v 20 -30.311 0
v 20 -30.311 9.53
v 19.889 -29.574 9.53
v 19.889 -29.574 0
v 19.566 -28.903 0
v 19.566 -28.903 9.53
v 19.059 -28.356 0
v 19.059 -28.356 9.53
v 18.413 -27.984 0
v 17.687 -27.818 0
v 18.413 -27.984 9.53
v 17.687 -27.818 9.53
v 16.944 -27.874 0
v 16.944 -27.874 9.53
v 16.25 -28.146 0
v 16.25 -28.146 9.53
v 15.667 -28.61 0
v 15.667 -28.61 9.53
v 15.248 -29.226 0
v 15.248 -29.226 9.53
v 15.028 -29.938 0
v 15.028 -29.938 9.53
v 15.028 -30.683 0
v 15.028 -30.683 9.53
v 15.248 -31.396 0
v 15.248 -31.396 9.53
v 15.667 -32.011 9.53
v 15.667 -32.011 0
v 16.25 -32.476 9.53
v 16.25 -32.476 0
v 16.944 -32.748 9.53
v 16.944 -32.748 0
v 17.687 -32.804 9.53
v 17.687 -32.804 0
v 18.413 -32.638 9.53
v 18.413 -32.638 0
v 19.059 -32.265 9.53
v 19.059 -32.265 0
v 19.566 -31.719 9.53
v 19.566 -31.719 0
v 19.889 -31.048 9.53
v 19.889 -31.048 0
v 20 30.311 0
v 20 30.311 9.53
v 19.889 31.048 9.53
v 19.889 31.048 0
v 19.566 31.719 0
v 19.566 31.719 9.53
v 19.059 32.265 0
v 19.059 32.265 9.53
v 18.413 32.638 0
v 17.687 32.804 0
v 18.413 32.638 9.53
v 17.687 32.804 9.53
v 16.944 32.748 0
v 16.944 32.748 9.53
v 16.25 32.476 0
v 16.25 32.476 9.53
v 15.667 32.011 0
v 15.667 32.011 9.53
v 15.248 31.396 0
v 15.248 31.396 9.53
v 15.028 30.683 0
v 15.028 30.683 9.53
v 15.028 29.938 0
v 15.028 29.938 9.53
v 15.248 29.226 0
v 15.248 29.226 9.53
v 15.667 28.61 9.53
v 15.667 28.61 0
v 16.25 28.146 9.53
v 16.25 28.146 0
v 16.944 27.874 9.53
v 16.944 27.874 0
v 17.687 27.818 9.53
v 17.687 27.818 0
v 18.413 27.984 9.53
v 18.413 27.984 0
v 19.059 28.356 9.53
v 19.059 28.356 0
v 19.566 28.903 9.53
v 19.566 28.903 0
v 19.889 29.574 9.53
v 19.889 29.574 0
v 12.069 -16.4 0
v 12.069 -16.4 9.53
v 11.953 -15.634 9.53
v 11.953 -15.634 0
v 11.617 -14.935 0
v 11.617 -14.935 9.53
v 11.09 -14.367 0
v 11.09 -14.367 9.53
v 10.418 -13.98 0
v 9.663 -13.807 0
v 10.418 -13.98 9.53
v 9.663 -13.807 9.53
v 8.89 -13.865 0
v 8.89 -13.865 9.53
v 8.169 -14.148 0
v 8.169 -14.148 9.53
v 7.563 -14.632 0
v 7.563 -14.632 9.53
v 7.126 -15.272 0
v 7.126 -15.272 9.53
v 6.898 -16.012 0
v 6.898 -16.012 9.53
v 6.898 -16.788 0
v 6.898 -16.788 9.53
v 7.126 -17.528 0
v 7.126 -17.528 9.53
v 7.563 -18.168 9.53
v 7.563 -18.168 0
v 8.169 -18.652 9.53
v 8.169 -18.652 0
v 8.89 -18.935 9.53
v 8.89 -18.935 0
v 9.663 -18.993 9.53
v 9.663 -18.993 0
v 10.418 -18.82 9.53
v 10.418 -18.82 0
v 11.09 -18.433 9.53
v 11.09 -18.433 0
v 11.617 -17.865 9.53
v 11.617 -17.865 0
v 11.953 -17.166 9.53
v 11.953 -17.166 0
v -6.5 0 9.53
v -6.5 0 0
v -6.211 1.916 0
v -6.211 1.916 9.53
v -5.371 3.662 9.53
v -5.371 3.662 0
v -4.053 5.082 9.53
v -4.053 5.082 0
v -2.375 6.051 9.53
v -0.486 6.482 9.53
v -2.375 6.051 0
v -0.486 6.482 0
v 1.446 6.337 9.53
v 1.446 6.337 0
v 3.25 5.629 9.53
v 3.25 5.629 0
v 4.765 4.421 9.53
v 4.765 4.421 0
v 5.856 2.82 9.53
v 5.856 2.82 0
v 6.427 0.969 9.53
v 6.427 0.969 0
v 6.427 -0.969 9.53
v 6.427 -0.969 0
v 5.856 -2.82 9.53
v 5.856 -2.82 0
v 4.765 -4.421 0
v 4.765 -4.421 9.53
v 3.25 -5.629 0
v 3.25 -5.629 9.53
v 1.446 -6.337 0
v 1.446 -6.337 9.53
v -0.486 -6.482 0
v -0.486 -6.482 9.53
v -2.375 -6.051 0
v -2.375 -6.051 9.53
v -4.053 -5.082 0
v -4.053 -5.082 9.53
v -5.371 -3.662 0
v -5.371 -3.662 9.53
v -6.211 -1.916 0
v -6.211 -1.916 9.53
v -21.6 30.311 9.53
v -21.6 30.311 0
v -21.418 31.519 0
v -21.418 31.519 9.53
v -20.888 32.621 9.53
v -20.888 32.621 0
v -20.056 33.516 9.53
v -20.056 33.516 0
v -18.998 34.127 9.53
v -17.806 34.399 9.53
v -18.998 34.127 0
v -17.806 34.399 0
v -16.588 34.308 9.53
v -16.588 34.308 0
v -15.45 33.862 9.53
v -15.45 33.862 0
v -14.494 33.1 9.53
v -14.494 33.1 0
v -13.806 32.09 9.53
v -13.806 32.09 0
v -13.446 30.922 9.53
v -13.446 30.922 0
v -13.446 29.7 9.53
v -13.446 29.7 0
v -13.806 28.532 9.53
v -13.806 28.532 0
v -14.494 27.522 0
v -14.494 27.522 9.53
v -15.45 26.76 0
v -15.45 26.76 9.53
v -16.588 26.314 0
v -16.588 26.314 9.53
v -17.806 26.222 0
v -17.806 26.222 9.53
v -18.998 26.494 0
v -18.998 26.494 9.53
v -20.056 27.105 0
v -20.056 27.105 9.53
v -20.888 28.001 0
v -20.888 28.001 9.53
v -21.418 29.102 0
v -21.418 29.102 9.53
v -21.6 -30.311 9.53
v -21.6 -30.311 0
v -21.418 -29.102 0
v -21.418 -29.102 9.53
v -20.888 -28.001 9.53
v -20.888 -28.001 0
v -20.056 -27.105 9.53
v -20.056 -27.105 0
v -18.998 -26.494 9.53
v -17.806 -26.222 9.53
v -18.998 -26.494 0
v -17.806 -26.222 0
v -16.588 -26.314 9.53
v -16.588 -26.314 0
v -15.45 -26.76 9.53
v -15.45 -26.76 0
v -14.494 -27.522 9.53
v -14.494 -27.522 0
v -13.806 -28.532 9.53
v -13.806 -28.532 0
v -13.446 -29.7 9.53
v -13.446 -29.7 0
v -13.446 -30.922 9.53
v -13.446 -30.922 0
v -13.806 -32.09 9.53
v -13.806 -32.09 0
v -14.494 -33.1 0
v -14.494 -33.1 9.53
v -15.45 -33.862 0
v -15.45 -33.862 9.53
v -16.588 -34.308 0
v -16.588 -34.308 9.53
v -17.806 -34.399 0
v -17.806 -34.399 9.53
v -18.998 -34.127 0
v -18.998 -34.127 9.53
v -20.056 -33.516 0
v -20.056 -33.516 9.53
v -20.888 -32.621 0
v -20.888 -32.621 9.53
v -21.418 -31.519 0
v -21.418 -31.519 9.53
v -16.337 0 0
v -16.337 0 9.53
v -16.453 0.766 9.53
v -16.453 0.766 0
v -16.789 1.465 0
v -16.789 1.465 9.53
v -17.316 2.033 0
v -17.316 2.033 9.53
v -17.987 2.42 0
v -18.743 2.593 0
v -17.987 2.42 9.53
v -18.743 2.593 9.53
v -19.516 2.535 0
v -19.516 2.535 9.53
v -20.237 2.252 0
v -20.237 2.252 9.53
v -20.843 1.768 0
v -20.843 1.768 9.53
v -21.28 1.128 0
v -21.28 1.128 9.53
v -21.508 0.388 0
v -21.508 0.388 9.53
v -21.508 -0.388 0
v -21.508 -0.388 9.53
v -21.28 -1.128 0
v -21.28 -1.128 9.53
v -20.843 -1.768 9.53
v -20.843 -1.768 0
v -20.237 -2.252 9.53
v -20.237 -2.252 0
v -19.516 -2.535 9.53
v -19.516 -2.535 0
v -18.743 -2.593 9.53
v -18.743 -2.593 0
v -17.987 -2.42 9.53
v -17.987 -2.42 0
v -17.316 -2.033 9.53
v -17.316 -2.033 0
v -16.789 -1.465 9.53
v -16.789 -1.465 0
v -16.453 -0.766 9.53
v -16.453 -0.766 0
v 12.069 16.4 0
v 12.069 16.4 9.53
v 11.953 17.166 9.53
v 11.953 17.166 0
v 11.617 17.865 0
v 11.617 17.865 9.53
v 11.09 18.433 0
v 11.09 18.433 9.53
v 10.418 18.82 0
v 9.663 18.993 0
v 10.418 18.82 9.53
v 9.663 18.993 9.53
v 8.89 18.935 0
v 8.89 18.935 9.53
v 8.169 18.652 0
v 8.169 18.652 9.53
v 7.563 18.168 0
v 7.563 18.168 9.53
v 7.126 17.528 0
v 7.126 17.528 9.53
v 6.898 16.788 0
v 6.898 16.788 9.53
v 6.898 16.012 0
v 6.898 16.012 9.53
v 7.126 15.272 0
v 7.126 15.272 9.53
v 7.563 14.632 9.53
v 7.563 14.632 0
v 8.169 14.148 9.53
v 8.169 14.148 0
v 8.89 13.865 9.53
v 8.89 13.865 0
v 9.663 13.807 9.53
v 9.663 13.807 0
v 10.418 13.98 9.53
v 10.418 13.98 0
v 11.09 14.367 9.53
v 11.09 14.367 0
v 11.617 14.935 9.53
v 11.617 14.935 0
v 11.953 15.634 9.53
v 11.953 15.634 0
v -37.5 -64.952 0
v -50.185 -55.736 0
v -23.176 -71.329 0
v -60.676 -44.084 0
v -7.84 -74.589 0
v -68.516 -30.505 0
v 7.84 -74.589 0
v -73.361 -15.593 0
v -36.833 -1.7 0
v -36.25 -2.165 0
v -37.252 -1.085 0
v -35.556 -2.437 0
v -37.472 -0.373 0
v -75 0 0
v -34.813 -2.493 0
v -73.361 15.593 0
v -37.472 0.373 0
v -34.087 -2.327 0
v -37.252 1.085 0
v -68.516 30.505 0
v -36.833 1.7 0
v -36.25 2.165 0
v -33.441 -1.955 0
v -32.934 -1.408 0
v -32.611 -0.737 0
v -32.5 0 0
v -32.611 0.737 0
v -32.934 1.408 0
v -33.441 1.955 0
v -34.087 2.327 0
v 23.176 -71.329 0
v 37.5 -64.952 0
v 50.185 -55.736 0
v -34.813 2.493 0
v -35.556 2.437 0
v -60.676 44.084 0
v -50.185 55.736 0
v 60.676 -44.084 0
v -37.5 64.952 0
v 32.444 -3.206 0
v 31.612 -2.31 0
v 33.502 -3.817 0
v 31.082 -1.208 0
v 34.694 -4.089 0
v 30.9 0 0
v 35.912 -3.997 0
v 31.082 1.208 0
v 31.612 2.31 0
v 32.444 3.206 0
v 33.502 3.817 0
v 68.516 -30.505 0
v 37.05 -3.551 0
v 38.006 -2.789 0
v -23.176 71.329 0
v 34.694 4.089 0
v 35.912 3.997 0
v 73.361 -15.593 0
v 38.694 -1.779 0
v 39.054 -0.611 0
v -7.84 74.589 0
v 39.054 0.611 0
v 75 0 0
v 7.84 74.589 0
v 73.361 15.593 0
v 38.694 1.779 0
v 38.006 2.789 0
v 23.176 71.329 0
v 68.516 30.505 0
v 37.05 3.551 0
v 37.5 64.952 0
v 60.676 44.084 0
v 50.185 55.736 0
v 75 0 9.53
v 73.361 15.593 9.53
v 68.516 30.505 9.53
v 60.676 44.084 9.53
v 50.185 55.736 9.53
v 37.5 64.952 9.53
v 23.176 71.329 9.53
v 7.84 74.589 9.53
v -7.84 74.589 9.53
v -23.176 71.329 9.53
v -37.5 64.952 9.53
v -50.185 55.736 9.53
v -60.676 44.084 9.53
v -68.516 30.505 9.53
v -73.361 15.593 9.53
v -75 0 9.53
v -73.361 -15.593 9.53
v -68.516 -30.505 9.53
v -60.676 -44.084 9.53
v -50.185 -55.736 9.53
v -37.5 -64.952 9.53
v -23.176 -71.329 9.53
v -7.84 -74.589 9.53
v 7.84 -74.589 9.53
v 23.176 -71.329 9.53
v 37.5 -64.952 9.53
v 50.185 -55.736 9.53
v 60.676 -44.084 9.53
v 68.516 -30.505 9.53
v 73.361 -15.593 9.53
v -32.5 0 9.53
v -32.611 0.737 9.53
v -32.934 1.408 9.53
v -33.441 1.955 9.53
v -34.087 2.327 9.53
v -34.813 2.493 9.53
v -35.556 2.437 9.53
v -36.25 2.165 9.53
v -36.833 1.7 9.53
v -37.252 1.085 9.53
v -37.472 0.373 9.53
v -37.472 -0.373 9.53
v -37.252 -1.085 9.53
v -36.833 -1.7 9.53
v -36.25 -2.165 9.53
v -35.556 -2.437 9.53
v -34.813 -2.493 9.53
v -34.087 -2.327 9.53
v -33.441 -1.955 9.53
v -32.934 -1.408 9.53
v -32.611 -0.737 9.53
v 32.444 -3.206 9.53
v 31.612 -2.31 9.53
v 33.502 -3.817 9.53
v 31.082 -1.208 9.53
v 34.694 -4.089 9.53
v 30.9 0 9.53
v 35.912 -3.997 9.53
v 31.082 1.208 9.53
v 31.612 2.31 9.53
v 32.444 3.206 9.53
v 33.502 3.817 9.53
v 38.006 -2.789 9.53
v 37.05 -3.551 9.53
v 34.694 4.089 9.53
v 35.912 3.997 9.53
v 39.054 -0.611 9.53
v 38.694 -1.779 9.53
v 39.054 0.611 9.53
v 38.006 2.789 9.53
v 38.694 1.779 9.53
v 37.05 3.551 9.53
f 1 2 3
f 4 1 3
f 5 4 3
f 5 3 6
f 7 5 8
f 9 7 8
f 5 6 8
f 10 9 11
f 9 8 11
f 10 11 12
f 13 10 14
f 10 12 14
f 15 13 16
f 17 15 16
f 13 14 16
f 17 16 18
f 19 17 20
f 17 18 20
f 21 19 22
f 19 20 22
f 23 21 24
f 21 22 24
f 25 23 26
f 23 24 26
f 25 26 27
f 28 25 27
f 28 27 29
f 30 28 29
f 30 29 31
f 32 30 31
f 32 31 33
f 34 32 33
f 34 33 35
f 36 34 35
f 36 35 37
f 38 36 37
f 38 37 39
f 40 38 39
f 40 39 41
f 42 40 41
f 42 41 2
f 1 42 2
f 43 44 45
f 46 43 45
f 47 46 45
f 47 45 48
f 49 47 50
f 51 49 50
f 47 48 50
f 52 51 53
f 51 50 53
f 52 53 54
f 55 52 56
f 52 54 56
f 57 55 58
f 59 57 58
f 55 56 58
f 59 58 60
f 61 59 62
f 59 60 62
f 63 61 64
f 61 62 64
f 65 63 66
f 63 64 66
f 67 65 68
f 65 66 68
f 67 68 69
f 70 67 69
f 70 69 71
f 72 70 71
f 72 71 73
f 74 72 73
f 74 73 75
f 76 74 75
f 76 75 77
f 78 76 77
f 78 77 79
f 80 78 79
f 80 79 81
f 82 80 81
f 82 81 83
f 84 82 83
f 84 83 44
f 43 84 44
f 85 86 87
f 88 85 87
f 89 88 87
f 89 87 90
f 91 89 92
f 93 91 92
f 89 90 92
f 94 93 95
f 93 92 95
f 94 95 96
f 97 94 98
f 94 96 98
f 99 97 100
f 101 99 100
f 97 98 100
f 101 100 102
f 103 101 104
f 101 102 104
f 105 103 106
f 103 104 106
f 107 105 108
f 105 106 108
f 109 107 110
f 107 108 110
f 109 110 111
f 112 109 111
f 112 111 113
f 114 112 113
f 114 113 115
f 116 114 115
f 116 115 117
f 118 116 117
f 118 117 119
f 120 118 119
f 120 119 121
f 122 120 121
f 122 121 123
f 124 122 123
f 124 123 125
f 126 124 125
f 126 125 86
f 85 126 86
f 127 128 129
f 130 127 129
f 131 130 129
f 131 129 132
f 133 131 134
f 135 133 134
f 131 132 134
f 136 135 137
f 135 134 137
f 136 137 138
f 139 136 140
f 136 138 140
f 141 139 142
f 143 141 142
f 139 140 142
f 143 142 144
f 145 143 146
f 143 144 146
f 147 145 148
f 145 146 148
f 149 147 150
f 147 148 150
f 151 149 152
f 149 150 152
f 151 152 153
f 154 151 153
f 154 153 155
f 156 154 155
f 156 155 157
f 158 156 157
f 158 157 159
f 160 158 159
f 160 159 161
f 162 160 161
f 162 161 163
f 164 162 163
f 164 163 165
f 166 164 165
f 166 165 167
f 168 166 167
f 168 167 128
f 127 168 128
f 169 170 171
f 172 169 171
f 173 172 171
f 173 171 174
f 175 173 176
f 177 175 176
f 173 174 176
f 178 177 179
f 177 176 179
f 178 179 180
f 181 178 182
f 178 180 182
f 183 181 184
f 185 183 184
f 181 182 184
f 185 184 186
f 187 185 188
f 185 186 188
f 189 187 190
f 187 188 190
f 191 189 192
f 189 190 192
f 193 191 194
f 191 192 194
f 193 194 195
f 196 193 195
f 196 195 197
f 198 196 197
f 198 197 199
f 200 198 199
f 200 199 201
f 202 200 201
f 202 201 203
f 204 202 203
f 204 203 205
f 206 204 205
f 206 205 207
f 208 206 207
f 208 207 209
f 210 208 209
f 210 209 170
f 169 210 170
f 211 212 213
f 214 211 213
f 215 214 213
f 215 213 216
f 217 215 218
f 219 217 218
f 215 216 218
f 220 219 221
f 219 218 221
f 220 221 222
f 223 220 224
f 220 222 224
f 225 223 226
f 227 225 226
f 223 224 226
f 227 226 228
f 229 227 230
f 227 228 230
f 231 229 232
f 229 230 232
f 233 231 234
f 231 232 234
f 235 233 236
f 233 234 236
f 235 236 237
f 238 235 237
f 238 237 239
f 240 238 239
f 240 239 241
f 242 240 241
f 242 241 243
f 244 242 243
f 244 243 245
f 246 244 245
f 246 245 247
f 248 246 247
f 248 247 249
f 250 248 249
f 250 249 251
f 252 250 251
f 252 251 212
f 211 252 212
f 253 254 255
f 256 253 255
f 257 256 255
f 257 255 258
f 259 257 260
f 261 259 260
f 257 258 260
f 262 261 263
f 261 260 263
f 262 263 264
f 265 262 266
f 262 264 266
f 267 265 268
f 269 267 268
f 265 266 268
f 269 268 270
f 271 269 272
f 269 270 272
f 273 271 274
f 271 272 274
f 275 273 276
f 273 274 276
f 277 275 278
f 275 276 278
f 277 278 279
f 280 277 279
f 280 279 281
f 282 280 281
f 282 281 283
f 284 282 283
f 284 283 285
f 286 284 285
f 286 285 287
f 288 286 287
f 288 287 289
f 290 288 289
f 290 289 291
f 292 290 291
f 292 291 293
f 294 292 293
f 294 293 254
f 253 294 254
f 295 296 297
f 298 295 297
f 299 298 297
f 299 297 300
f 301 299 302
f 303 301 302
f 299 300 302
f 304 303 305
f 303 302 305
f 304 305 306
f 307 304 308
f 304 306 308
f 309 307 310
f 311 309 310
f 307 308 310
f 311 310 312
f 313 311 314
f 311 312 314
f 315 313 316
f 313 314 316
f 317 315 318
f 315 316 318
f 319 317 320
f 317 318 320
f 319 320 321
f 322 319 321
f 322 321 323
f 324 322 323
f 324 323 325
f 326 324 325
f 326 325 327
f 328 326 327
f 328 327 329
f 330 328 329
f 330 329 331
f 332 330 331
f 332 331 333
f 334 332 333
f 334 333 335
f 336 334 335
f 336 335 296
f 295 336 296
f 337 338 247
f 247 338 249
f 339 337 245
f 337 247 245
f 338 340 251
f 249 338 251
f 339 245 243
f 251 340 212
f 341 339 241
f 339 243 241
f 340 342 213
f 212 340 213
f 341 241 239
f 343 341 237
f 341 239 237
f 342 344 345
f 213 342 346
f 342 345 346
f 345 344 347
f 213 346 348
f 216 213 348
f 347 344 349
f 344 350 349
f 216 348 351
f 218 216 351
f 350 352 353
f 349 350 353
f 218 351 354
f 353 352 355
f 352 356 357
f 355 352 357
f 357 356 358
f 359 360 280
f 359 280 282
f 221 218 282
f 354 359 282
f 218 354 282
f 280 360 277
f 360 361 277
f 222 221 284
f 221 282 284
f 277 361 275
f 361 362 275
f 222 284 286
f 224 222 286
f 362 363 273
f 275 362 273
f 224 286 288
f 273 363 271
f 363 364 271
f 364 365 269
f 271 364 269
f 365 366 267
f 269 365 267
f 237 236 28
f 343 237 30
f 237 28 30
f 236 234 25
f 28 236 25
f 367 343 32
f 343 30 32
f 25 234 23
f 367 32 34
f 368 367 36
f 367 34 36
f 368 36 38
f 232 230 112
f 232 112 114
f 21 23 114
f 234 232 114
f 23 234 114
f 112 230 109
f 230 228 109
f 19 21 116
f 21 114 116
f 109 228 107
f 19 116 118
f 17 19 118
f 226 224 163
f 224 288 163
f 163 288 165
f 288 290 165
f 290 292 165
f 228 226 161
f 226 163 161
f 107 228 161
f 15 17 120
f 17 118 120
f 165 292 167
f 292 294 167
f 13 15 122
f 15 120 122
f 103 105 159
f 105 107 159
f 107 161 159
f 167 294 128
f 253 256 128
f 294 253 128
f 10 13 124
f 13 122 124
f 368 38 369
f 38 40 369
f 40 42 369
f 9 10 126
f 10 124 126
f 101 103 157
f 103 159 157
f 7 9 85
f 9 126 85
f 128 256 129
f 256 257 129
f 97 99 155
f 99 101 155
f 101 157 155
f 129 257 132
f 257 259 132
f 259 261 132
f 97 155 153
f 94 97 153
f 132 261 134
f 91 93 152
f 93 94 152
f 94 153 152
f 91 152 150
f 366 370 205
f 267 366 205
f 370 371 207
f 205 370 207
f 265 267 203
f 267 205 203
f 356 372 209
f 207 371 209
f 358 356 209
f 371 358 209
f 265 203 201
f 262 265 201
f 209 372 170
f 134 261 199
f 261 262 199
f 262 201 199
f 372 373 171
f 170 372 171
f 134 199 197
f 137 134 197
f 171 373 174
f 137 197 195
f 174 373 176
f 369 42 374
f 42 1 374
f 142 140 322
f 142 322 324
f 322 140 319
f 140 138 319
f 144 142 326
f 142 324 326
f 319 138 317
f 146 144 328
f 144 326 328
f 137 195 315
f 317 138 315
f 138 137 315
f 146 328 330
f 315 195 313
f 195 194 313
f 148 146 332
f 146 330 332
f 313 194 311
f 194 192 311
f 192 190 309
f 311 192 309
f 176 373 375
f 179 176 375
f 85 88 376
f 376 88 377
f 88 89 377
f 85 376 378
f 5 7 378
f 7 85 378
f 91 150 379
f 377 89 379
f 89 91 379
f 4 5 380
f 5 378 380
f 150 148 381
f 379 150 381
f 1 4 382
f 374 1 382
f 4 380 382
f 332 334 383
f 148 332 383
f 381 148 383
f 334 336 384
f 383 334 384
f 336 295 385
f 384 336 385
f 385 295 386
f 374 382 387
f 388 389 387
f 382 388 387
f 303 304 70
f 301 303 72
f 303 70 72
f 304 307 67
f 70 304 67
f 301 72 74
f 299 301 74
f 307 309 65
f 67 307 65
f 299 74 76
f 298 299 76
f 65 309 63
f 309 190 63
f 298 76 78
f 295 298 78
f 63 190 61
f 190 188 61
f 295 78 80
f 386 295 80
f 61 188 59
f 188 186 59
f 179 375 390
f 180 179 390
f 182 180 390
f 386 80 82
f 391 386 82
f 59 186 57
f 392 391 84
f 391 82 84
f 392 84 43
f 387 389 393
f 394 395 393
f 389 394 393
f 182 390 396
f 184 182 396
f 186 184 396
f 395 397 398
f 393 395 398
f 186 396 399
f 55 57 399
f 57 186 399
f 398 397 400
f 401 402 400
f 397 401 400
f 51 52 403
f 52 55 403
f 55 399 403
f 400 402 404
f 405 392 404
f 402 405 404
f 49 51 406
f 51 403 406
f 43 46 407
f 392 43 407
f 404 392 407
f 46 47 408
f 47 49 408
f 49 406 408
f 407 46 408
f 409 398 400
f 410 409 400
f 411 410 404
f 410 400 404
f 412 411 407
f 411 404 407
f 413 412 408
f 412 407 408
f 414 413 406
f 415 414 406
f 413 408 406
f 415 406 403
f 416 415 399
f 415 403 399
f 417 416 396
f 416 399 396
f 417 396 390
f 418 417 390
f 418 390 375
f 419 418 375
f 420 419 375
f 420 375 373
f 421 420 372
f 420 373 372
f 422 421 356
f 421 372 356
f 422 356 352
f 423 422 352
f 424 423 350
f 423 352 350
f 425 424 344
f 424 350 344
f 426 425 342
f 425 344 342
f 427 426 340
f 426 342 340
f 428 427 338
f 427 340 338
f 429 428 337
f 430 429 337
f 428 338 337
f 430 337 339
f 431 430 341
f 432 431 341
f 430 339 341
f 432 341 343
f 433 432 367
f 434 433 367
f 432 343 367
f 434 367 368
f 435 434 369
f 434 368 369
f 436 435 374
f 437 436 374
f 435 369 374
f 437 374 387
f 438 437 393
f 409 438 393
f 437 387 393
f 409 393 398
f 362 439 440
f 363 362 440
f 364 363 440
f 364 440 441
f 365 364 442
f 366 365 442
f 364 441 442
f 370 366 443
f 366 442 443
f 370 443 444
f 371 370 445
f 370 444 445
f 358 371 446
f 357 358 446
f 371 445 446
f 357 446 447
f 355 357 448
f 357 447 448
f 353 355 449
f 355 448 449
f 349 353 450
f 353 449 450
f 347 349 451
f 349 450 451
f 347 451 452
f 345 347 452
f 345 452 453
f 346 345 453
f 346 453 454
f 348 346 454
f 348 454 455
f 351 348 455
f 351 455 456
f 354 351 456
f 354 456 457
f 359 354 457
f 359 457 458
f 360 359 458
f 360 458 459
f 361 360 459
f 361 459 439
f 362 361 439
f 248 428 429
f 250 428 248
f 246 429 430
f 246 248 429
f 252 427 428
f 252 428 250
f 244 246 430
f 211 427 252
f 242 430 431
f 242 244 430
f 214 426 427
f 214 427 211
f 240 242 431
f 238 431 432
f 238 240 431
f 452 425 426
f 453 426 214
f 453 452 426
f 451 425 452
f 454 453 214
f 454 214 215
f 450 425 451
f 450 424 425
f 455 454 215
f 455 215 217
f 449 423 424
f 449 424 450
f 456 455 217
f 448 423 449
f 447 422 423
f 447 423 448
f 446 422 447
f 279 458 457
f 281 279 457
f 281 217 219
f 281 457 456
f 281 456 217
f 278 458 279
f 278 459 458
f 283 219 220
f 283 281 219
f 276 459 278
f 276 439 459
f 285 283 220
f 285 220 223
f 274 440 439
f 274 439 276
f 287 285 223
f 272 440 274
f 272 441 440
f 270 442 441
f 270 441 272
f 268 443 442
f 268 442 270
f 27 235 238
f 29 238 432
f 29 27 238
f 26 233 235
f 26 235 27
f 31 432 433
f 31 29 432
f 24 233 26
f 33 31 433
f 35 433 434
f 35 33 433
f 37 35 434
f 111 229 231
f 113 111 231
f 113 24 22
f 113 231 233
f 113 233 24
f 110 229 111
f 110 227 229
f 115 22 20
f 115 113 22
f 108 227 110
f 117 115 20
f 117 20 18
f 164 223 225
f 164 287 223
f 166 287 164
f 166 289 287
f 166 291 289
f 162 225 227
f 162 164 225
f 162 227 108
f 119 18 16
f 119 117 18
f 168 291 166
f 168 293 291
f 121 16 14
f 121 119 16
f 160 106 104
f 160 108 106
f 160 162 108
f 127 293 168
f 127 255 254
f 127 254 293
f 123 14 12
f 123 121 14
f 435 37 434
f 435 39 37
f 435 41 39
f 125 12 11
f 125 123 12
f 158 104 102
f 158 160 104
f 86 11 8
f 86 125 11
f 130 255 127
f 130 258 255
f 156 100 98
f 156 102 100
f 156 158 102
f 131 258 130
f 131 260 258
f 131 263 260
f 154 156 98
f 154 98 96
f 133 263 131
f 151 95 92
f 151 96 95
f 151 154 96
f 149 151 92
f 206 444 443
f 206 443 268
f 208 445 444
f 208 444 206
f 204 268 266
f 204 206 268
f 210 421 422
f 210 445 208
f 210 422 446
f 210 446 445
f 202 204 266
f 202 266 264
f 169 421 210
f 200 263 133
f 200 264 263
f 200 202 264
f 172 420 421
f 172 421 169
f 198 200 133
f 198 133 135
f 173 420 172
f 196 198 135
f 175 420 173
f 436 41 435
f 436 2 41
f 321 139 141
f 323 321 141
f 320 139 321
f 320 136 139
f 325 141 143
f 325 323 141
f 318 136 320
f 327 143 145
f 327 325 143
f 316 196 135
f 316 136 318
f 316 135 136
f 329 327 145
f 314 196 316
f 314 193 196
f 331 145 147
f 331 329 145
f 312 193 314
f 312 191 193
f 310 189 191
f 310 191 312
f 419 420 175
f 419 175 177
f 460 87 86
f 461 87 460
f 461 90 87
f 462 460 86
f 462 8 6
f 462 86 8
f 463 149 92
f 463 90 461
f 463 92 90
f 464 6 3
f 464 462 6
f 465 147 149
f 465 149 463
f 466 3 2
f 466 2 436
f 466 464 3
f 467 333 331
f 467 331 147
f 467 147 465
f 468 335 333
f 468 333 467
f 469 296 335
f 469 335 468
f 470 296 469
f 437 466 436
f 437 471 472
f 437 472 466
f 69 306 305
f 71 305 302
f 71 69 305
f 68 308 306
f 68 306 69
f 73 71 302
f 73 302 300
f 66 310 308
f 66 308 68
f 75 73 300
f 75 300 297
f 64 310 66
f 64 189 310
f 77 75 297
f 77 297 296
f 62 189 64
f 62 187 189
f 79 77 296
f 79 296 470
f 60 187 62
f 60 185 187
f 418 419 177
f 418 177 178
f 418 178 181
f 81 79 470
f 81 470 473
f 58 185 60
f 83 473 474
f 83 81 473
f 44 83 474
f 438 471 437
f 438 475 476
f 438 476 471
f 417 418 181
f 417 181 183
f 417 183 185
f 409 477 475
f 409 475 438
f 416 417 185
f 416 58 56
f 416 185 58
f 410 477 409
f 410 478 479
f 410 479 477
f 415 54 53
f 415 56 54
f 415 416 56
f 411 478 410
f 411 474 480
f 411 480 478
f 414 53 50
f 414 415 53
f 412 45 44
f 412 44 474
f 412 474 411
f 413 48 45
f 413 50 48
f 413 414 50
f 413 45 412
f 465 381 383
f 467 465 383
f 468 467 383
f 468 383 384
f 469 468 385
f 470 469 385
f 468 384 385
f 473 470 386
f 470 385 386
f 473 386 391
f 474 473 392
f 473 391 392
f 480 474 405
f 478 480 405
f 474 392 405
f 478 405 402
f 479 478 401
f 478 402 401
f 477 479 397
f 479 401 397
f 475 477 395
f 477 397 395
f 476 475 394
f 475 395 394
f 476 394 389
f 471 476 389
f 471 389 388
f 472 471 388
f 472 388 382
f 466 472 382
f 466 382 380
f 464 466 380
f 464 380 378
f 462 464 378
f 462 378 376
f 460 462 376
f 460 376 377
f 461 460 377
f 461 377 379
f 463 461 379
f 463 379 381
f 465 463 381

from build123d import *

# Parameters (mm, degrees)
CROQUIS1_R              = 75
SALIENTE_EXTRUIR1_DEPTH = 9.53
CORTAR_EXTRUIR1_REACH   = 11.53
CROQUIS2_R              = 4.1
CORTAR_EXTRUIR2_REACH   = 11.53
CROQUIS3_R              = 6.5
CORTAR_EXTRUIR3_REACH   = 11.53
CROQUIS4_R              = 2.6
CORTAR_EXTRUIR4_REACH   = 11.53
CROQUIS5_R              = 2.5


with BuildPart() as part:
    # Croquis1 → Saliente-Extruir1 (new body)
    with BuildSketch(Plane.XY):
        Circle(CROQUIS1_R)
    extrude(amount=SALIENTE_EXTRUIR1_DEPTH)

    # Croquis2 → Cortar-Extruir1 (cut, up to next)
    with BuildSketch(Plane(origin=(0, 0, 0), x_dir=(-1, 0, 0), z_dir=(0, 0, -1)), mode=Mode.PRIVATE) as cortar_extruir1_sk1:
        with Locations((-35, 0)):
            Circle(CROQUIS2_R)
    cortar_extruir1_tool1 = extrude(cortar_extruir1_sk1.sketch, amount=-CORTAR_EXTRUIR1_REACH, mode=Mode.PRIVATE) & part.part
    add(cortar_extruir1_tool1.solids().sort_by_distance((35, 0, 0))[0], mode=Mode.SUBTRACT)
    # Croquis2 → Cortar-Extruir1 (cut, up to next)
    with BuildSketch(Plane(origin=(0, 0, 0), x_dir=(-1, 0, 0), z_dir=(0, 0, -1)), mode=Mode.PRIVATE) as cortar_extruir1_sk2:
        with Locations((17.5, 30.310889132)):
            Circle(CROQUIS2_R)
    cortar_extruir1_tool2 = extrude(cortar_extruir1_sk2.sketch, amount=-CORTAR_EXTRUIR1_REACH, mode=Mode.PRIVATE) & part.part
    add(cortar_extruir1_tool2.solids().sort_by_distance((-17.5, 30.310889, 0))[0], mode=Mode.SUBTRACT)
    # Croquis2 → Cortar-Extruir1 (cut, up to next)
    with BuildSketch(Plane(origin=(0, 0, 0), x_dir=(-1, 0, 0), z_dir=(0, 0, -1)), mode=Mode.PRIVATE) as cortar_extruir1_sk3:
        with Locations((17.5, -30.310889132)):
            Circle(CROQUIS2_R)
    cortar_extruir1_tool3 = extrude(cortar_extruir1_sk3.sketch, amount=-CORTAR_EXTRUIR1_REACH, mode=Mode.PRIVATE) & part.part
    add(cortar_extruir1_tool3.solids().sort_by_distance((-17.5, -30.310889, 0))[0], mode=Mode.SUBTRACT)

    # Croquis3 → Cortar-Extruir2 (cut, up to next)
    with BuildSketch(Plane(origin=(0, 0, 0), x_dir=(-1, 0, 0), z_dir=(0, 0, -1)), mode=Mode.PRIVATE) as cortar_extruir2_sk1:
        Circle(CROQUIS3_R)
    cortar_extruir2_tool1 = extrude(cortar_extruir2_sk1.sketch, amount=-CORTAR_EXTRUIR2_REACH, mode=Mode.PRIVATE) & part.part
    add(cortar_extruir2_tool1.solids().sort_by_distance((0, 0, 0))[0], mode=Mode.SUBTRACT)

    # Croquis4 → Cortar-Extruir3 (cut, up to next)
    with BuildSketch(Plane.XY.offset(9.53), mode=Mode.PRIVATE) as cortar_extruir3_sk1:
        with Locations((-18.937088829, 0)):
            Circle(CROQUIS4_R)
    cortar_extruir3_tool1 = extrude(cortar_extruir3_sk1.sketch, amount=-CORTAR_EXTRUIR3_REACH, mode=Mode.PRIVATE) & part.part
    add(cortar_extruir3_tool1.solids().sort_by_distance((-18.937089, 0, 9.53))[0], mode=Mode.SUBTRACT)
    # Croquis4 → Cortar-Extruir3 (cut, up to next)
    with BuildSketch(Plane.XY.offset(9.53), mode=Mode.PRIVATE) as cortar_extruir3_sk2:
        with Locations((9.468544415, 16.4)):
            Circle(CROQUIS4_R)
    cortar_extruir3_tool2 = extrude(cortar_extruir3_sk2.sketch, amount=-CORTAR_EXTRUIR3_REACH, mode=Mode.PRIVATE) & part.part
    add(cortar_extruir3_tool2.solids().sort_by_distance((9.468544, 16.4, 9.53))[0], mode=Mode.SUBTRACT)
    # Croquis4 → Cortar-Extruir3 (cut, up to next)
    with BuildSketch(Plane.XY.offset(9.53), mode=Mode.PRIVATE) as cortar_extruir3_sk3:
        with Locations((9.468544415, -16.4)):
            Circle(CROQUIS4_R)
    cortar_extruir3_tool3 = extrude(cortar_extruir3_sk3.sketch, amount=-CORTAR_EXTRUIR3_REACH, mode=Mode.PRIVATE) & part.part
    add(cortar_extruir3_tool3.solids().sort_by_distance((9.468544, -16.4, 9.53))[0], mode=Mode.SUBTRACT)

    # Croquis5 → Cortar-Extruir4 (cut, up to next)
    with BuildSketch(Plane.XY.offset(9.53), mode=Mode.PRIVATE) as cortar_extruir4_sk1:
        with Locations((-35, 0)):
            Circle(CROQUIS5_R)
    cortar_extruir4_tool1 = extrude(cortar_extruir4_sk1.sketch, amount=-CORTAR_EXTRUIR4_REACH, mode=Mode.PRIVATE) & part.part
    add(cortar_extruir4_tool1.solids().sort_by_distance((-35, 0, 9.53))[0], mode=Mode.SUBTRACT)
    # Croquis5 → Cortar-Extruir4 (cut, up to next)
    with BuildSketch(Plane.XY.offset(9.53), mode=Mode.PRIVATE) as cortar_extruir4_sk2:
        with Locations((17.5, 30.310889132)):
            Circle(CROQUIS5_R)
    cortar_extruir4_tool2 = extrude(cortar_extruir4_sk2.sketch, amount=-CORTAR_EXTRUIR4_REACH, mode=Mode.PRIVATE) & part.part
    add(cortar_extruir4_tool2.solids().sort_by_distance((17.5, 30.310889, 9.53))[0], mode=Mode.SUBTRACT)
    # Croquis5 → Cortar-Extruir4 (cut, up to next)
    with BuildSketch(Plane.XY.offset(9.53), mode=Mode.PRIVATE) as cortar_extruir4_sk3:
        with Locations((17.5, -30.310889132)):
            Circle(CROQUIS5_R)
    cortar_extruir4_tool3 = extrude(cortar_extruir4_sk3.sketch, amount=-CORTAR_EXTRUIR4_REACH, mode=Mode.PRIVATE) & part.part
    add(cortar_extruir4_tool3.solids().sort_by_distance((17.5, -30.310889, 9.53))[0], mode=Mode.SUBTRACT)


solid = part.part
